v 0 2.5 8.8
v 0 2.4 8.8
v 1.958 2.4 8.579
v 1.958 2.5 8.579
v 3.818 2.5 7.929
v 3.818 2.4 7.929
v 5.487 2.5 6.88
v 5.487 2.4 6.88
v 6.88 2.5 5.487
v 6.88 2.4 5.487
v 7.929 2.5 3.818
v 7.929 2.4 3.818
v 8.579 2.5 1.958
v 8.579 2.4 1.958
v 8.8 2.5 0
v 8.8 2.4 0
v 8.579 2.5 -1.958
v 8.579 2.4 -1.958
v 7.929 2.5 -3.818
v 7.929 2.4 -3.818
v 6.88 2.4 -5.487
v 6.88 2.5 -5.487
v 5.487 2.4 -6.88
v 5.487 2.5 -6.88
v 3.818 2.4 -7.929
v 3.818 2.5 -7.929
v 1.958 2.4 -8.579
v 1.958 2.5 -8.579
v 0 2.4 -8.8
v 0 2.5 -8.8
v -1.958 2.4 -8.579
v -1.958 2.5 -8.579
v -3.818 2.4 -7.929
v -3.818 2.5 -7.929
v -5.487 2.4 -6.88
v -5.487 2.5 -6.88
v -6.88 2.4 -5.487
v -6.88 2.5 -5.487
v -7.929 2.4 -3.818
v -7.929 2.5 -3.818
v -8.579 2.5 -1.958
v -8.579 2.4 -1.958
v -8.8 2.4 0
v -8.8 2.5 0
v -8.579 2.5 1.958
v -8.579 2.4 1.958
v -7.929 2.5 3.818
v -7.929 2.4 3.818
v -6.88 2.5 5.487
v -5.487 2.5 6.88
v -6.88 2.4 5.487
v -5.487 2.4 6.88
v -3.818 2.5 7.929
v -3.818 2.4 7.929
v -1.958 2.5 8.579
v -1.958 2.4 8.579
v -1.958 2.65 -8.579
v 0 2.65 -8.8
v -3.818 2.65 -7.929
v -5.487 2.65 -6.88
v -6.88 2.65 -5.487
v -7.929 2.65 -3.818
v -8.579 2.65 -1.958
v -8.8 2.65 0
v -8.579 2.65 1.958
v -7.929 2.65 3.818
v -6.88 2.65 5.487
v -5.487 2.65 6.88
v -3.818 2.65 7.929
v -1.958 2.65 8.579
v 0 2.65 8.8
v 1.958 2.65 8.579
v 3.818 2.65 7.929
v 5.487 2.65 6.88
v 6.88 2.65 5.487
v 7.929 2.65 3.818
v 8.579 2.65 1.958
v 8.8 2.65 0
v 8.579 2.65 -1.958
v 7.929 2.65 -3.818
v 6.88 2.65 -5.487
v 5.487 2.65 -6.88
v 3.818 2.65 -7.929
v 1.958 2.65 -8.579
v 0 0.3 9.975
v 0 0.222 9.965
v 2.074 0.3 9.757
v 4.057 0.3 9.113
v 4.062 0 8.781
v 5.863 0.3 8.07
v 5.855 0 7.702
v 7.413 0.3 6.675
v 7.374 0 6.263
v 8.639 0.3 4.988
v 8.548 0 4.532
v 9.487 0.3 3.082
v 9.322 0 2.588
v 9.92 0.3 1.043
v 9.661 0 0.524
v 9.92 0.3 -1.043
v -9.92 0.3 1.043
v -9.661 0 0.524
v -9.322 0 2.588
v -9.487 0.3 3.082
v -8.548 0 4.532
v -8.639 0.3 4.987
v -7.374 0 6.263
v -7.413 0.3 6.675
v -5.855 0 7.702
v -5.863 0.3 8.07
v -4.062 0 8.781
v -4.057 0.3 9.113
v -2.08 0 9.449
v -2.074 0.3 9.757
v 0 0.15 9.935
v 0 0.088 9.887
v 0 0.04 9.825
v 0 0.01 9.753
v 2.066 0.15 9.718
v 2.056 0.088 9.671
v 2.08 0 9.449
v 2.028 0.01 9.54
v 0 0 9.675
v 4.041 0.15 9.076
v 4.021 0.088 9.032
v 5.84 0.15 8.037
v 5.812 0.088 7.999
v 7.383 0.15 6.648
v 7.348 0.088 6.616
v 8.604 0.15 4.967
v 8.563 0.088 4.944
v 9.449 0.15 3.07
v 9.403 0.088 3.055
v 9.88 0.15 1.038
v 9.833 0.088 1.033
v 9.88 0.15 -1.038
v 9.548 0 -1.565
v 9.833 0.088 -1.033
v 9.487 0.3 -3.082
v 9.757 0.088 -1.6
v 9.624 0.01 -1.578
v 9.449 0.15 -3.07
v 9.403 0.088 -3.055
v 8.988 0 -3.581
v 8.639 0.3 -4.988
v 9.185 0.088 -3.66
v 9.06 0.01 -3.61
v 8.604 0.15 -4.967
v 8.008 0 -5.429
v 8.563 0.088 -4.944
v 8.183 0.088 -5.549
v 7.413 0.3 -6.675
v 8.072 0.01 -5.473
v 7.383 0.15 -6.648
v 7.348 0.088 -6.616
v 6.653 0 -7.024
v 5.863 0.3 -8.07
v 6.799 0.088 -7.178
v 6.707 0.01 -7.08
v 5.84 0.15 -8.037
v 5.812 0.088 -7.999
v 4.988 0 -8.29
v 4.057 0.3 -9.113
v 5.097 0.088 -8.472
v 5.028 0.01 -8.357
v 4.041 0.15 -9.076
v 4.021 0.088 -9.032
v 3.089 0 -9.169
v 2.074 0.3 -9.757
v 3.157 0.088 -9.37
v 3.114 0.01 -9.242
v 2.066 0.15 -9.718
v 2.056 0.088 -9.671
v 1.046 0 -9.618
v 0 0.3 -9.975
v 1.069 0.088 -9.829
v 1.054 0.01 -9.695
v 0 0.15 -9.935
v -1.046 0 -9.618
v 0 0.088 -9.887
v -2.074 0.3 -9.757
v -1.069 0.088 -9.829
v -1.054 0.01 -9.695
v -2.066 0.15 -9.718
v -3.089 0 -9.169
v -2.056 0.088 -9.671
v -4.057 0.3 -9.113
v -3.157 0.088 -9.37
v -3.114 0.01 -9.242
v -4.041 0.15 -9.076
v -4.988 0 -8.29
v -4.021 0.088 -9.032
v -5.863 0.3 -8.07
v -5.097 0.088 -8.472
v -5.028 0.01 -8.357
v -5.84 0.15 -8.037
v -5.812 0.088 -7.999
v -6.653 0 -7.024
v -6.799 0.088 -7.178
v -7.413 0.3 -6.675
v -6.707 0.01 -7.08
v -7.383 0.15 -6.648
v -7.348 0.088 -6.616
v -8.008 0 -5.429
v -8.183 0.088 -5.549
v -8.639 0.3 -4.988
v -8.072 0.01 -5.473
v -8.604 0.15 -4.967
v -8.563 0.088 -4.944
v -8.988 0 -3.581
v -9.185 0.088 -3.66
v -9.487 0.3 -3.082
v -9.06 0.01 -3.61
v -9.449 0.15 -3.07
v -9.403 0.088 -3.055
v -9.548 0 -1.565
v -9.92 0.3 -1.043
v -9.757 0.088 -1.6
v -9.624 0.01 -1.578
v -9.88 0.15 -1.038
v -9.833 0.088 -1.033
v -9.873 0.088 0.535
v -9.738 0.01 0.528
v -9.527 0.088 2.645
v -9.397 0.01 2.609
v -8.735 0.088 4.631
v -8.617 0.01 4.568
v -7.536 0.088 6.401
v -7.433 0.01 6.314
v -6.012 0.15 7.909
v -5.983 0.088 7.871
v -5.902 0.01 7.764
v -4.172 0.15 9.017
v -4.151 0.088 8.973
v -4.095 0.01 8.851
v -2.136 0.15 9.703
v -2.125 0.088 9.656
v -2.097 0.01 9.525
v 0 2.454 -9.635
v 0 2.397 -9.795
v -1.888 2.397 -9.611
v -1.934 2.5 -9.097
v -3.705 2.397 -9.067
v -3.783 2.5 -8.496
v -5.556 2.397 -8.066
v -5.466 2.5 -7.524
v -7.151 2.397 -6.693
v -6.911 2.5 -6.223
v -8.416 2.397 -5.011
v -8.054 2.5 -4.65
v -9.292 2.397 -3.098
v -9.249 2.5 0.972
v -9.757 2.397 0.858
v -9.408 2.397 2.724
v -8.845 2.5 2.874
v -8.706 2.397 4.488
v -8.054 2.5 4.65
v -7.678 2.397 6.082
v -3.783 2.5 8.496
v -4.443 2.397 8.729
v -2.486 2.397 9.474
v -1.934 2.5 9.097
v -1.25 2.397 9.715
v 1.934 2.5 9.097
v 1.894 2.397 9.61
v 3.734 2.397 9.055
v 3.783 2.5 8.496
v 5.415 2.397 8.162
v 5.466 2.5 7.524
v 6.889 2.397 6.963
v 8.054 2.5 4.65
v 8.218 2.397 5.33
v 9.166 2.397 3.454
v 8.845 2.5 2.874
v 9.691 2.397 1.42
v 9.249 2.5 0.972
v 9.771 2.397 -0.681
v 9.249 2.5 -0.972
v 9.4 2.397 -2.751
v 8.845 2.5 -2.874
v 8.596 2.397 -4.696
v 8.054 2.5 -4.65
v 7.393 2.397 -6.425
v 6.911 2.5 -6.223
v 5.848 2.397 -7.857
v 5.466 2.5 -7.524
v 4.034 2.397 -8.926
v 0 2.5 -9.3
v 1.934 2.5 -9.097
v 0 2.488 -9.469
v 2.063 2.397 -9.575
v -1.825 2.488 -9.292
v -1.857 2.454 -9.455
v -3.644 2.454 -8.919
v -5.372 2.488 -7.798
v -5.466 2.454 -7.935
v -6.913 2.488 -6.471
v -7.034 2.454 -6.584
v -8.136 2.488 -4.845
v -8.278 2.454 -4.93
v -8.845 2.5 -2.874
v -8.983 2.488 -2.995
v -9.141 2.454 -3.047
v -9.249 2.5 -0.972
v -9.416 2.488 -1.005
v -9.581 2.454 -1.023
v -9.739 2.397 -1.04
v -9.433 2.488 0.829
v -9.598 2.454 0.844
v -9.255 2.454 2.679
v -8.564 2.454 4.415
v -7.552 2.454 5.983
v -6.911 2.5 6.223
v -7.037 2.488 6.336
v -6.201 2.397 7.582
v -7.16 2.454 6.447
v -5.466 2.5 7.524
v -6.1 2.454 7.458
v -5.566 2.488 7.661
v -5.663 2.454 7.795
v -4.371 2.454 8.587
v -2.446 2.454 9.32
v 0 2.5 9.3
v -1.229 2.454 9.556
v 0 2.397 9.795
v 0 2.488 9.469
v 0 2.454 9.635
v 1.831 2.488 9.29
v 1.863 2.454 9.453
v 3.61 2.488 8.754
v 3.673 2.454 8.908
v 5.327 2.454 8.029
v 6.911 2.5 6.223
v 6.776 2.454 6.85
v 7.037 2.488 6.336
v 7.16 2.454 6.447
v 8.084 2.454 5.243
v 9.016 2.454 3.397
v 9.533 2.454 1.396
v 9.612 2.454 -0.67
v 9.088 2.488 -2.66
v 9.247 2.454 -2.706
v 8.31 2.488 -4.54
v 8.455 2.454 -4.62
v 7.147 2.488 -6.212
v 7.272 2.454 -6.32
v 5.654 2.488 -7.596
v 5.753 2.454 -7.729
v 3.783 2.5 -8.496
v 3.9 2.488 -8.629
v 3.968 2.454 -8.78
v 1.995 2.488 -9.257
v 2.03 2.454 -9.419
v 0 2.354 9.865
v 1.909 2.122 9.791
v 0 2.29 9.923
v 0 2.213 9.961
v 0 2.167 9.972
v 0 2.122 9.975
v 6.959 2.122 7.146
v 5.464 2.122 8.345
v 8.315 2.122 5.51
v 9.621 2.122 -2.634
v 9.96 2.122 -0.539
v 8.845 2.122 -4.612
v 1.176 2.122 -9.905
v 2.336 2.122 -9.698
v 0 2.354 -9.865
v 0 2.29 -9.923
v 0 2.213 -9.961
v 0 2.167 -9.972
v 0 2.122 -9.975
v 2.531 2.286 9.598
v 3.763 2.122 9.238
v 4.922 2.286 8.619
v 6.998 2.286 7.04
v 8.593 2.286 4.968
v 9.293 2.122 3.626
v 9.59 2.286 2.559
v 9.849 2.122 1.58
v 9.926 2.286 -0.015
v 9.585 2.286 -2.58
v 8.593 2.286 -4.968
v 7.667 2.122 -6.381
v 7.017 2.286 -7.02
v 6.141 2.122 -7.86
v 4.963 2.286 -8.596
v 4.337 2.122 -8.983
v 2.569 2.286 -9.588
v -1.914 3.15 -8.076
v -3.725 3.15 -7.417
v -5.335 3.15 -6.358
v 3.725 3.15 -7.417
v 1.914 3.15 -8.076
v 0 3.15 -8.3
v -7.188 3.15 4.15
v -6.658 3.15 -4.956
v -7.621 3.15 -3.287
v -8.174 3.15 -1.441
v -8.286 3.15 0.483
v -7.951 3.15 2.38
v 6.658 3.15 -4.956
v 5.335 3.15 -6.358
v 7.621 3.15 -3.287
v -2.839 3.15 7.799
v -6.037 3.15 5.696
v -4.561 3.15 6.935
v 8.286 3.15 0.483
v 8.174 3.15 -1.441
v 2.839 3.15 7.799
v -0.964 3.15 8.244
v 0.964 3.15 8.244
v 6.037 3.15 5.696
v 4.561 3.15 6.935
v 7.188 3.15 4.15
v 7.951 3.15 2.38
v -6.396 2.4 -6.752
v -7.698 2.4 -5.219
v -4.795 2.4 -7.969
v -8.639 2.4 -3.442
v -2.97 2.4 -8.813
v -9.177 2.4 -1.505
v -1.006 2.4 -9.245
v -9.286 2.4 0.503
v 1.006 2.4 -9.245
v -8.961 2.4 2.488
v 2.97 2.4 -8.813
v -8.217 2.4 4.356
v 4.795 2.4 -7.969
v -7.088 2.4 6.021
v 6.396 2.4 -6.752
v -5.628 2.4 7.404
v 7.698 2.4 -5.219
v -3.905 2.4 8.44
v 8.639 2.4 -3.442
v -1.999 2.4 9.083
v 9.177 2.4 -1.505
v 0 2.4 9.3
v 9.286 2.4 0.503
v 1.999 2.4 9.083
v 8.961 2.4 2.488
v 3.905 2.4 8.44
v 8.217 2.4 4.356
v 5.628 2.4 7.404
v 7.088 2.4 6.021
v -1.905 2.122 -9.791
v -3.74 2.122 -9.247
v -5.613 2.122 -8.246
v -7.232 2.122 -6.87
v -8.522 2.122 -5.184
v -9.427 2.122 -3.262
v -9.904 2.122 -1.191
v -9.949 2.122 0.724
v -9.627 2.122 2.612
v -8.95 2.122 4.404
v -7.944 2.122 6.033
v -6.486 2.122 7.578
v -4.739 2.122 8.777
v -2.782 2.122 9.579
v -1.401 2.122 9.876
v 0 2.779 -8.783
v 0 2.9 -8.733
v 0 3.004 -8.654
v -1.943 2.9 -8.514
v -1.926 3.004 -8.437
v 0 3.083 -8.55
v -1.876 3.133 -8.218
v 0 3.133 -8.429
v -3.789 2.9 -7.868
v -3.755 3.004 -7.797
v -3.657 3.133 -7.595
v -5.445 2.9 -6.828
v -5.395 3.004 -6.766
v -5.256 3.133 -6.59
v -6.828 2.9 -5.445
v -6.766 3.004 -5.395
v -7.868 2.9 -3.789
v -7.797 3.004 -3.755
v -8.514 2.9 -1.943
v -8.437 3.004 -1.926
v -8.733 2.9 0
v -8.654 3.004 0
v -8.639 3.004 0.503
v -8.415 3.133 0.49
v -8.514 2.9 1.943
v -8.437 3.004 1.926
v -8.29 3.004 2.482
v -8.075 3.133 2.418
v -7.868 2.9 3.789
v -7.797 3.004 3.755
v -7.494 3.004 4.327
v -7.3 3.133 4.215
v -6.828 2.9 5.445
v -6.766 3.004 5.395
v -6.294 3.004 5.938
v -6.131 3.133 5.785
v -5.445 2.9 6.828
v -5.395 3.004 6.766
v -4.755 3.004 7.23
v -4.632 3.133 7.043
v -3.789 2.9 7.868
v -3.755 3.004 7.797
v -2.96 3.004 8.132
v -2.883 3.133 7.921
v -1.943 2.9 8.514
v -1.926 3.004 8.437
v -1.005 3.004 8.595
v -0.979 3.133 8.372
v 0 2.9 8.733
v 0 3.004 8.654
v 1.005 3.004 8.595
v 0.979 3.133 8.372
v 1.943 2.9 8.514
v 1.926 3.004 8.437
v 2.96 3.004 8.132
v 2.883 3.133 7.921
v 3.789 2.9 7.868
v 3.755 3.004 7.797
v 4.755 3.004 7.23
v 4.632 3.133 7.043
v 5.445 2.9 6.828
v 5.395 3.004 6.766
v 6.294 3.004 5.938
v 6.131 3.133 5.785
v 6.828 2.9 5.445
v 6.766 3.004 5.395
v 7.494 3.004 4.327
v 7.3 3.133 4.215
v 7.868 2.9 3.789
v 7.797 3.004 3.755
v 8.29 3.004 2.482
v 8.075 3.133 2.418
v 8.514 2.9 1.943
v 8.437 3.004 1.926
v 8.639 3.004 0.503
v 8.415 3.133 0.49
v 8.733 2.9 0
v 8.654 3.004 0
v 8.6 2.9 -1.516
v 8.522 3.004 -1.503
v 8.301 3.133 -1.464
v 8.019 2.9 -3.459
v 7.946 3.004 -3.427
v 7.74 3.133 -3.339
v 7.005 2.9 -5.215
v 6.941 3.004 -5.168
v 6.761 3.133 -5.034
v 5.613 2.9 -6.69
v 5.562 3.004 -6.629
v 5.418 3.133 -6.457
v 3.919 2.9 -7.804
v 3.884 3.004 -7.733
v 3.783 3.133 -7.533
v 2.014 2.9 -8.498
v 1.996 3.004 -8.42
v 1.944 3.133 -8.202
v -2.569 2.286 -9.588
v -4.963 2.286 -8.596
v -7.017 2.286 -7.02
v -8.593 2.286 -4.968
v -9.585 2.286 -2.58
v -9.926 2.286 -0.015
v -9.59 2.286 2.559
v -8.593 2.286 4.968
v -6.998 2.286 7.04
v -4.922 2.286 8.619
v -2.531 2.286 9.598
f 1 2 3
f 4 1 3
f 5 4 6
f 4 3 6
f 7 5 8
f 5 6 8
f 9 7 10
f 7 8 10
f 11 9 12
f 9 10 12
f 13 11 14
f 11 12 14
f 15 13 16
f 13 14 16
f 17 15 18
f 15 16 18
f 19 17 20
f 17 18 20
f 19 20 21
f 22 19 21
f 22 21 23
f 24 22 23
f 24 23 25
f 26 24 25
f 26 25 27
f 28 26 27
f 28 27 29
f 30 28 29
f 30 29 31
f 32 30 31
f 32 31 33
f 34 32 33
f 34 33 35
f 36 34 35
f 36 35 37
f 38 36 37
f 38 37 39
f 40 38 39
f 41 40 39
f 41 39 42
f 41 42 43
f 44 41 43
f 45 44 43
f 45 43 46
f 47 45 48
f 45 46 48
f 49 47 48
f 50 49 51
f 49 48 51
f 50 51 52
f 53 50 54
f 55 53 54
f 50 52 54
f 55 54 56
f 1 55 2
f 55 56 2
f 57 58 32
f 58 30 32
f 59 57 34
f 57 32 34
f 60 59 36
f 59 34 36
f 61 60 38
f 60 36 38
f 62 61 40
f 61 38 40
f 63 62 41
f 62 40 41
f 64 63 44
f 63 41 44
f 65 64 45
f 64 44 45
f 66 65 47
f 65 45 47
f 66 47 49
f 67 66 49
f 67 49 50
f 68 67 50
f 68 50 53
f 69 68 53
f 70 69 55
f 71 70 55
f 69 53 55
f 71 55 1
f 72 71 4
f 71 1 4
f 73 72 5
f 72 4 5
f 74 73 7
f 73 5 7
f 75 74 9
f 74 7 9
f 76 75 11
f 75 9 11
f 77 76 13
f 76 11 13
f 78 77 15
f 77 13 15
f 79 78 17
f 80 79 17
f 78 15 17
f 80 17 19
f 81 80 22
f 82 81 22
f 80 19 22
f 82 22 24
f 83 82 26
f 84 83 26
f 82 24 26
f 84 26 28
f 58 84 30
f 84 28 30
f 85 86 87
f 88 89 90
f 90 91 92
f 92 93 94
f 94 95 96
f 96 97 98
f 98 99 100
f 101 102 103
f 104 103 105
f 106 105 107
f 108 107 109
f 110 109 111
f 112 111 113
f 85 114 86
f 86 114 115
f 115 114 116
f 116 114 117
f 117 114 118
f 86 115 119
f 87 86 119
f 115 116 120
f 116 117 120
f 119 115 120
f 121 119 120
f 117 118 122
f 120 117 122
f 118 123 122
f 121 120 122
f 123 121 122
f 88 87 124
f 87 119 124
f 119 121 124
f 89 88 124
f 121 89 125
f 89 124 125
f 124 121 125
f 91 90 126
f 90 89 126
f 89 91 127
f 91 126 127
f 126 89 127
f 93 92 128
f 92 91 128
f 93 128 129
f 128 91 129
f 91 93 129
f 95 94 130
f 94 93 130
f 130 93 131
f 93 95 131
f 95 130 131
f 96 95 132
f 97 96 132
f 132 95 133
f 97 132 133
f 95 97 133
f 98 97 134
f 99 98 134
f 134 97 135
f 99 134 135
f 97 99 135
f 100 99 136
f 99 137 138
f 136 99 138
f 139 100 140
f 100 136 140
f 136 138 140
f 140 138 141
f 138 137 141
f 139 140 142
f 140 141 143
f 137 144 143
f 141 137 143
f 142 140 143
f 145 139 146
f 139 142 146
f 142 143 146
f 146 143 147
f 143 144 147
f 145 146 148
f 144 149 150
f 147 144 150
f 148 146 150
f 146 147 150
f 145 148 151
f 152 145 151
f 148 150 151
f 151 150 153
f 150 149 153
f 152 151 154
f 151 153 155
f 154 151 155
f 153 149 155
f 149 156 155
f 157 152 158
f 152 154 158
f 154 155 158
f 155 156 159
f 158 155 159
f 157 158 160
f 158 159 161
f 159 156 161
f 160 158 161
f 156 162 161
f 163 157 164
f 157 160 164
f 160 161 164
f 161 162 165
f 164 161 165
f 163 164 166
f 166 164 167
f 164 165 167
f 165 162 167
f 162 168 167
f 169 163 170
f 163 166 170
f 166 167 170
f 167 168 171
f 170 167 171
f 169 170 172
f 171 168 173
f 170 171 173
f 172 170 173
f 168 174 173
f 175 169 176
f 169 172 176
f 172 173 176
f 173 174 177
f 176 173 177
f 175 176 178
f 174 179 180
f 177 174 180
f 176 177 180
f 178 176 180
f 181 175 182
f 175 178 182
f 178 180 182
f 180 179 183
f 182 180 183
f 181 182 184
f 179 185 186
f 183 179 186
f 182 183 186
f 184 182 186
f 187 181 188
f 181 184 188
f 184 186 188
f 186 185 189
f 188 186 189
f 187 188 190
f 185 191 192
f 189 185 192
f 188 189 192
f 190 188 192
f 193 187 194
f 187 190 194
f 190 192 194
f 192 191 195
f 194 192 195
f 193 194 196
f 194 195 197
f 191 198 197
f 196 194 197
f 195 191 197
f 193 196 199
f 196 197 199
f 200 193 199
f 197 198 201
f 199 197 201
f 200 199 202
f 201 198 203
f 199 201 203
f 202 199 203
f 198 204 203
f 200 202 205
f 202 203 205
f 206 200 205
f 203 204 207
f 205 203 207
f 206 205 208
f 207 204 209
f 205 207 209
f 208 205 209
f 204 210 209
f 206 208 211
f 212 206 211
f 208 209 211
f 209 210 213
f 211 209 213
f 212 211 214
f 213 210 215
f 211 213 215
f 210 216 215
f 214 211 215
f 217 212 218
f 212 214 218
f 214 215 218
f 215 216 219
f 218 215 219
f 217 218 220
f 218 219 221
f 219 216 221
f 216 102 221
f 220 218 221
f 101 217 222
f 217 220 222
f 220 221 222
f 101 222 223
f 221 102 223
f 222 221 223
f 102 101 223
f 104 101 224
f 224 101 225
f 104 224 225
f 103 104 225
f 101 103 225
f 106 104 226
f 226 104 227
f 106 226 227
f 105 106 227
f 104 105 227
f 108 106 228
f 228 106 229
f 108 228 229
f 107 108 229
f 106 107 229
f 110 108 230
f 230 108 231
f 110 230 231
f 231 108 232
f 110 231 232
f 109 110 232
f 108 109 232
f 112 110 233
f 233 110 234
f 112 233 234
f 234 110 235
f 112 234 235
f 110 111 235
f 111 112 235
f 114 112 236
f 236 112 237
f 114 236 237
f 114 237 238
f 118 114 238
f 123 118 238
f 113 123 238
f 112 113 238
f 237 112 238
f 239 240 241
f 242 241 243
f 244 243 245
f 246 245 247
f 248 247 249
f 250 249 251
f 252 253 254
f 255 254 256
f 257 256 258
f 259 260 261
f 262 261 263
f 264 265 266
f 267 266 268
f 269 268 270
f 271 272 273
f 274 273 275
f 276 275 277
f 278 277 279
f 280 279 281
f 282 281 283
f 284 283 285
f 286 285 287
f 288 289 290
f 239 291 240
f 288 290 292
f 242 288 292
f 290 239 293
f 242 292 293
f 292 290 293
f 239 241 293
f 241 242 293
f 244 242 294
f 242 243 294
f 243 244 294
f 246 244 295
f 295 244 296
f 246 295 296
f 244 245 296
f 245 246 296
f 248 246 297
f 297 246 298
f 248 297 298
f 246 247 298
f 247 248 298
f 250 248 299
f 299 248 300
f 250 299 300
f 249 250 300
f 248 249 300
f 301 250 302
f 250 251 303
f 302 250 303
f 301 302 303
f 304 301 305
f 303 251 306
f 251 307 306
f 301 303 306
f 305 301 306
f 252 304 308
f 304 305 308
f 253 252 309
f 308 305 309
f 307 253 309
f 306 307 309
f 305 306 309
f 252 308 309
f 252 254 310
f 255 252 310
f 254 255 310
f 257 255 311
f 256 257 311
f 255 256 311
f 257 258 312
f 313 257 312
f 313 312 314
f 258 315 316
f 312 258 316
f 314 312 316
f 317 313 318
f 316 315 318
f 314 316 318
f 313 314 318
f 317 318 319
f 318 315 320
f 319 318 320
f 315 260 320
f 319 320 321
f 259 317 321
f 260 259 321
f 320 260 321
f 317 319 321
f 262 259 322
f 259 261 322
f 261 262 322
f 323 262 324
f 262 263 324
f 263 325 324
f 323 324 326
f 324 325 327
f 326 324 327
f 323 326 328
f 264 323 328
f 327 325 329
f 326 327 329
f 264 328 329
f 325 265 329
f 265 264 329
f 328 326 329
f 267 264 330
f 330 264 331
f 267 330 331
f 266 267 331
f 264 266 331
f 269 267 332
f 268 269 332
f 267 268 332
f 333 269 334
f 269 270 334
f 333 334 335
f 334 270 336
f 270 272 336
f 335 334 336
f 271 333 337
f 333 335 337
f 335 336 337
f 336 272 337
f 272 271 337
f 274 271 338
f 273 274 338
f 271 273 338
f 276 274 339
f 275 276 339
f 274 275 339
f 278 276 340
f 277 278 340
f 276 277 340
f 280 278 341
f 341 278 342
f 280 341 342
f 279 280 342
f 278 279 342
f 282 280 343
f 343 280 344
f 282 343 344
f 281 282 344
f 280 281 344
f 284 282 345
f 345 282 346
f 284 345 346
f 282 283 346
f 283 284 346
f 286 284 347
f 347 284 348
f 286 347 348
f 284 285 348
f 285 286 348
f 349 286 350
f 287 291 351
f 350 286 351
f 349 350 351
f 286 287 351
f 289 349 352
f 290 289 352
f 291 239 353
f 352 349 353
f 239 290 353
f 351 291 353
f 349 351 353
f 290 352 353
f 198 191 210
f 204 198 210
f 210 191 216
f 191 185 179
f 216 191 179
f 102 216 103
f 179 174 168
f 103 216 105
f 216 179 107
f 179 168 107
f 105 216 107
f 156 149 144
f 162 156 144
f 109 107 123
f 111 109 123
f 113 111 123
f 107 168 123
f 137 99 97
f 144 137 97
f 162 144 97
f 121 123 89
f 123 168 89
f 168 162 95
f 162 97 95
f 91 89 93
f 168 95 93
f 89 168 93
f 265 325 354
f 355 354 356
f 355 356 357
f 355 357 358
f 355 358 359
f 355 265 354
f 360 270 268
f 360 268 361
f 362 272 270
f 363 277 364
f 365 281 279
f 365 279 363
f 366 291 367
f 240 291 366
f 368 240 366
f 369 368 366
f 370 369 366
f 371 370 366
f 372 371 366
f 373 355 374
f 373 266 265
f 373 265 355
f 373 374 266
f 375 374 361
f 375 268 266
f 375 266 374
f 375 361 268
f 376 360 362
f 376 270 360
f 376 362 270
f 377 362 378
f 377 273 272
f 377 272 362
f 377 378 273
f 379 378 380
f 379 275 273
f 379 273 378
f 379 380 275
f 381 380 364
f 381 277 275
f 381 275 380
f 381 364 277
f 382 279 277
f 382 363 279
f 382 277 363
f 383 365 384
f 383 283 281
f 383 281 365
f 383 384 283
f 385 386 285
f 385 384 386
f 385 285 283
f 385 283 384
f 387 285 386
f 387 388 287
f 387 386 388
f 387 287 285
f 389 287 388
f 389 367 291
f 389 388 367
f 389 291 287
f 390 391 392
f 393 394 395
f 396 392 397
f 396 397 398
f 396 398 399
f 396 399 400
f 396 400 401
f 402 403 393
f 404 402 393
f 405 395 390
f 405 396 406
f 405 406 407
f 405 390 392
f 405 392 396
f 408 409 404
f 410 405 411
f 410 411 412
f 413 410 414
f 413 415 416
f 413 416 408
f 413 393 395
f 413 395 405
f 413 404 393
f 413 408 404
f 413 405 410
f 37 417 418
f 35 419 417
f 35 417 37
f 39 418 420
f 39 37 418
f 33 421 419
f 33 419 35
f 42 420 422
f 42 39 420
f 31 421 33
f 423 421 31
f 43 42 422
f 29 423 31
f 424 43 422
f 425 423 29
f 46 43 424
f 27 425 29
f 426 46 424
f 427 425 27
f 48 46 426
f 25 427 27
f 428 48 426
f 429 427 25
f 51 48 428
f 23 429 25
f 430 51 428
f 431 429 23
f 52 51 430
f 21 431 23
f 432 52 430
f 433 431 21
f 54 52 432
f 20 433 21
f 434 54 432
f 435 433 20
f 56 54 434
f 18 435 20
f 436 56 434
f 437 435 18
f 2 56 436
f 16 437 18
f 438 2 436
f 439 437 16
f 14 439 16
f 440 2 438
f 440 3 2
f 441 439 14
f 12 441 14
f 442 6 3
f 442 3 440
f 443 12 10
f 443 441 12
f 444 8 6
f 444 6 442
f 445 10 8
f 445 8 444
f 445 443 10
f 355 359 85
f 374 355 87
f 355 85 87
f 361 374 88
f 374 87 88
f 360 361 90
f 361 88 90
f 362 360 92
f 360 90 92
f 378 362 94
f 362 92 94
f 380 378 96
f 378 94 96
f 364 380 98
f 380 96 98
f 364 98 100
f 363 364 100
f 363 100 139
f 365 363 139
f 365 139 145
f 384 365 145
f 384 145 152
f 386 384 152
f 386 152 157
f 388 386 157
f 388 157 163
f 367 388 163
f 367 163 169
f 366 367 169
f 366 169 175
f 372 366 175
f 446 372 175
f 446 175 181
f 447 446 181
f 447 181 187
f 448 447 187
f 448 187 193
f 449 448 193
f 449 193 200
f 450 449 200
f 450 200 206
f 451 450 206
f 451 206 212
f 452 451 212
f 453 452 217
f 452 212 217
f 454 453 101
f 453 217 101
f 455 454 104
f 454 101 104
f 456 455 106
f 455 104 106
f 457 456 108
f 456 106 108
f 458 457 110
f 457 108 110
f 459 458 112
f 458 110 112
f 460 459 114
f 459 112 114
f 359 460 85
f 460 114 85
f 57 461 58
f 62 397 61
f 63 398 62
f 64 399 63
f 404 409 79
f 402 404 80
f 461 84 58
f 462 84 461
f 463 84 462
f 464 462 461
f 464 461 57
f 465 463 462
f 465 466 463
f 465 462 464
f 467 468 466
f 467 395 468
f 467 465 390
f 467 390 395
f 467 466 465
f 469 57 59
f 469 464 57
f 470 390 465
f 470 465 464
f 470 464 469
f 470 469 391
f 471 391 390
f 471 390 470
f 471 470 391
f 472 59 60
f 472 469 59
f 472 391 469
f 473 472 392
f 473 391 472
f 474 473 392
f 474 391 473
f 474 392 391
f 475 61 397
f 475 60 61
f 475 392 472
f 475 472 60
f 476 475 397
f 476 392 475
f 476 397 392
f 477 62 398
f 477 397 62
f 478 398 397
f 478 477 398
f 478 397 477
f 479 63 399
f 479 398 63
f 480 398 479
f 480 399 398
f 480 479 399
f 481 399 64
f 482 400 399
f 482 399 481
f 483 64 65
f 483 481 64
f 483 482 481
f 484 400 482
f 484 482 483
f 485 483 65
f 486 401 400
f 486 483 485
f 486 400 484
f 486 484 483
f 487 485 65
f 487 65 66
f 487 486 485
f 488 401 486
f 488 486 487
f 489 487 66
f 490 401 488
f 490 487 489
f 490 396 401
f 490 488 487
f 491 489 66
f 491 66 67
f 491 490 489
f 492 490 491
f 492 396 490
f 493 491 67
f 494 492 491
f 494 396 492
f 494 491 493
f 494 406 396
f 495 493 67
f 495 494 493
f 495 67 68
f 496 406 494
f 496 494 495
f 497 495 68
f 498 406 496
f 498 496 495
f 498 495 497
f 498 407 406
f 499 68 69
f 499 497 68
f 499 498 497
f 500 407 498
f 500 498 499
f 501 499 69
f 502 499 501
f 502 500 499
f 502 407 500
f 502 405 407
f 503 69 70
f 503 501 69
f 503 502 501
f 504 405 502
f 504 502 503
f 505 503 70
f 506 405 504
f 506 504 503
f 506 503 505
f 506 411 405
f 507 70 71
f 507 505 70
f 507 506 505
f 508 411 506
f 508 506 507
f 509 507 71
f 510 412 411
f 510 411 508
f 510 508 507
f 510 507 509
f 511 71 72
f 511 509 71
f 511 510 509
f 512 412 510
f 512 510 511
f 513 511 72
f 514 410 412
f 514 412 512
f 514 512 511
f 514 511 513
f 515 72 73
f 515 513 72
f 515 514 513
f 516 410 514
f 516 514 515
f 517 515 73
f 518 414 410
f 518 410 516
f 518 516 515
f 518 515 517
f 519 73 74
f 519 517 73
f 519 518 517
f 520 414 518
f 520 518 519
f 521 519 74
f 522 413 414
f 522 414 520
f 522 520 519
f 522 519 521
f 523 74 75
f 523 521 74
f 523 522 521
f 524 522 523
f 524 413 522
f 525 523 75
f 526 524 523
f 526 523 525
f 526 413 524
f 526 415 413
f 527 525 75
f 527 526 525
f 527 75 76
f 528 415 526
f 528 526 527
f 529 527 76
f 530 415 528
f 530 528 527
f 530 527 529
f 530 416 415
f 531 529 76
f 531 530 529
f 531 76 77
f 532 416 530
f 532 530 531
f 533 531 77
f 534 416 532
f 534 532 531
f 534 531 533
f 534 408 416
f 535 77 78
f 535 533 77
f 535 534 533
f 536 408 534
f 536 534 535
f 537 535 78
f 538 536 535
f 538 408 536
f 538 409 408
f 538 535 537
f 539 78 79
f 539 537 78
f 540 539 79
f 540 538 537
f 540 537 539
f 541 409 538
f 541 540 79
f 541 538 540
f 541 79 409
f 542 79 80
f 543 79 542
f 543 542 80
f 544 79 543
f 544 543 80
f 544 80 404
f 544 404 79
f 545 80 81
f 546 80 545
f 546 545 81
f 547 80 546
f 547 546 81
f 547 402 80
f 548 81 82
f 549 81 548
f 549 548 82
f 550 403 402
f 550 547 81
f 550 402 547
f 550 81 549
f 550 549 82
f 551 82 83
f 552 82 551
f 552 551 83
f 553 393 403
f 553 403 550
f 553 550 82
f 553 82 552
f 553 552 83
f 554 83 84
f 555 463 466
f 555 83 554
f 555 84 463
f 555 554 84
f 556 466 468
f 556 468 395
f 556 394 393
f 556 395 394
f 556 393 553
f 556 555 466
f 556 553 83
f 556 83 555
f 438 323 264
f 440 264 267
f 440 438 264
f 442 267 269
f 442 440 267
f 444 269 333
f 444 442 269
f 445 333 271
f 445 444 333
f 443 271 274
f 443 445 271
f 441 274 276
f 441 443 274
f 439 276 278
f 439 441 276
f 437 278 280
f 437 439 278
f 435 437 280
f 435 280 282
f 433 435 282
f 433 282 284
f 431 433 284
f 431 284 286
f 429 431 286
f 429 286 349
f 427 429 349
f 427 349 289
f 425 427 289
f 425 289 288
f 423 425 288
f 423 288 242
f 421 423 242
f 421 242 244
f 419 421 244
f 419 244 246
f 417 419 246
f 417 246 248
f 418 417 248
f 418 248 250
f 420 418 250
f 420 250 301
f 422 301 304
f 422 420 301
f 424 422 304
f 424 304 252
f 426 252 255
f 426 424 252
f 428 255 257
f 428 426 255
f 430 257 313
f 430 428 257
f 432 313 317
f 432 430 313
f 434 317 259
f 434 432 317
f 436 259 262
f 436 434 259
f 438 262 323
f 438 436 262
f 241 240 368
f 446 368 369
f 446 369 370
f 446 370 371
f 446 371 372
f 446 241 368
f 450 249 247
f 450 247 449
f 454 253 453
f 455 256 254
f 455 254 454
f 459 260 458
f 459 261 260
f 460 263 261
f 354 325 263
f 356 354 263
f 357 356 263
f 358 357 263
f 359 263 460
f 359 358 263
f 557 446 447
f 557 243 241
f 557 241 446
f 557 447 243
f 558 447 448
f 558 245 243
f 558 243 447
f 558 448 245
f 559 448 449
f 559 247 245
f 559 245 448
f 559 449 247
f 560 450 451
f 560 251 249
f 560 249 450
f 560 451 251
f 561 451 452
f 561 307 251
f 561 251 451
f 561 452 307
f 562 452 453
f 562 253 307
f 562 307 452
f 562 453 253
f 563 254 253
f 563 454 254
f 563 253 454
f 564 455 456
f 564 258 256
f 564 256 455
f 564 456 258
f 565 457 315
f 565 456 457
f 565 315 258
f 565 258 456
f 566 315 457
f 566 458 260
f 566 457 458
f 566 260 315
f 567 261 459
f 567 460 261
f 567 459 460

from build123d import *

# Parameters (mm, degrees)
SKETCH1_R           = 9.975
BOSS_EXTRUDE1_DEPTH = 3.15
FILLET1_R           = 0.5
CUT_EXTRUDE1_START  = -0.1
SKETCH3_R           = 9.3
SKETCH3_R_2         = 8.8
CUT_EXTRUDE1_DEPTH  = 0.1
FILLET2_R           = 0.3


with BuildPart() as part:
    # Sketch1 → Boss-Extrude1 (new body)
    with BuildSketch(Plane(origin=(0, 0, 0), x_dir=(1, 0, 0), z_dir=(0, 1, 0))):
        with Locations(Location((0, 0, 0), (0, 0, 270))):
            Circle(SKETCH1_R)
    extrude(amount=BOSS_EXTRUDE1_DEPTH)

    # Sketch2 → Cut-Revolve1 (revolve, cut)
    with BuildSketch(Plane.XY, mode=Mode.PRIVATE) as cut_revolve1_sk:
        with BuildLine():
            Line((8.8, 3.15), (8.8, 2.5))
            Line((8.8, 2.5), (9.3, 2.5))
            ThreePointArc((9.3, 2.5), (9.652003196, 2.448948287), (9.975, 2.3))
            Line((9.975, 2.3), (9.975, 3.15))
            Line((9.975, 3.15), (8.8, 3.15))
        make_face()
    revolve(cut_revolve1_sk.sketch.rotate(Axis((0, 0, 0), (0, 1, 0)), 90), axis=Axis((0, 0, 0), (0, 1, 0)), mode=Mode.SUBTRACT)

    # Fillet1
    fillet1_edges = [part.edges().sort_by_distance(p)[0] for p in [
        (0, 3.15, 8.8),
    ]]
    fillet(fillet1_edges, radius=FILLET1_R)

    # Sketch3 → Cut-Extrude1 (cut)
    with BuildSketch(Plane(origin=(0, 2.5, 0), x_dir=(1, 0, 0), z_dir=(0, 1, 0)).offset(CUT_EXTRUDE1_START)):
        with Locations(Location((0, 0, 0), (0, 0, 270))):
            Circle(SKETCH3_R)
        with Locations(Location((0, 0, 0), (0, 0, 270))):
            Circle(SKETCH3_R_2, mode=Mode.SUBTRACT)
    extrude(amount=CUT_EXTRUDE1_DEPTH, mode=Mode.SUBTRACT)

    # Fillet2
    fillet2_edges = [part.edges().sort_by_distance(p)[0] for p in [
        (0, 0, -9.975),
        (-9.975, 2.3, 0),
    ]]
    fillet(fillet2_edges, radius=FILLET2_R)


solid = part.part
